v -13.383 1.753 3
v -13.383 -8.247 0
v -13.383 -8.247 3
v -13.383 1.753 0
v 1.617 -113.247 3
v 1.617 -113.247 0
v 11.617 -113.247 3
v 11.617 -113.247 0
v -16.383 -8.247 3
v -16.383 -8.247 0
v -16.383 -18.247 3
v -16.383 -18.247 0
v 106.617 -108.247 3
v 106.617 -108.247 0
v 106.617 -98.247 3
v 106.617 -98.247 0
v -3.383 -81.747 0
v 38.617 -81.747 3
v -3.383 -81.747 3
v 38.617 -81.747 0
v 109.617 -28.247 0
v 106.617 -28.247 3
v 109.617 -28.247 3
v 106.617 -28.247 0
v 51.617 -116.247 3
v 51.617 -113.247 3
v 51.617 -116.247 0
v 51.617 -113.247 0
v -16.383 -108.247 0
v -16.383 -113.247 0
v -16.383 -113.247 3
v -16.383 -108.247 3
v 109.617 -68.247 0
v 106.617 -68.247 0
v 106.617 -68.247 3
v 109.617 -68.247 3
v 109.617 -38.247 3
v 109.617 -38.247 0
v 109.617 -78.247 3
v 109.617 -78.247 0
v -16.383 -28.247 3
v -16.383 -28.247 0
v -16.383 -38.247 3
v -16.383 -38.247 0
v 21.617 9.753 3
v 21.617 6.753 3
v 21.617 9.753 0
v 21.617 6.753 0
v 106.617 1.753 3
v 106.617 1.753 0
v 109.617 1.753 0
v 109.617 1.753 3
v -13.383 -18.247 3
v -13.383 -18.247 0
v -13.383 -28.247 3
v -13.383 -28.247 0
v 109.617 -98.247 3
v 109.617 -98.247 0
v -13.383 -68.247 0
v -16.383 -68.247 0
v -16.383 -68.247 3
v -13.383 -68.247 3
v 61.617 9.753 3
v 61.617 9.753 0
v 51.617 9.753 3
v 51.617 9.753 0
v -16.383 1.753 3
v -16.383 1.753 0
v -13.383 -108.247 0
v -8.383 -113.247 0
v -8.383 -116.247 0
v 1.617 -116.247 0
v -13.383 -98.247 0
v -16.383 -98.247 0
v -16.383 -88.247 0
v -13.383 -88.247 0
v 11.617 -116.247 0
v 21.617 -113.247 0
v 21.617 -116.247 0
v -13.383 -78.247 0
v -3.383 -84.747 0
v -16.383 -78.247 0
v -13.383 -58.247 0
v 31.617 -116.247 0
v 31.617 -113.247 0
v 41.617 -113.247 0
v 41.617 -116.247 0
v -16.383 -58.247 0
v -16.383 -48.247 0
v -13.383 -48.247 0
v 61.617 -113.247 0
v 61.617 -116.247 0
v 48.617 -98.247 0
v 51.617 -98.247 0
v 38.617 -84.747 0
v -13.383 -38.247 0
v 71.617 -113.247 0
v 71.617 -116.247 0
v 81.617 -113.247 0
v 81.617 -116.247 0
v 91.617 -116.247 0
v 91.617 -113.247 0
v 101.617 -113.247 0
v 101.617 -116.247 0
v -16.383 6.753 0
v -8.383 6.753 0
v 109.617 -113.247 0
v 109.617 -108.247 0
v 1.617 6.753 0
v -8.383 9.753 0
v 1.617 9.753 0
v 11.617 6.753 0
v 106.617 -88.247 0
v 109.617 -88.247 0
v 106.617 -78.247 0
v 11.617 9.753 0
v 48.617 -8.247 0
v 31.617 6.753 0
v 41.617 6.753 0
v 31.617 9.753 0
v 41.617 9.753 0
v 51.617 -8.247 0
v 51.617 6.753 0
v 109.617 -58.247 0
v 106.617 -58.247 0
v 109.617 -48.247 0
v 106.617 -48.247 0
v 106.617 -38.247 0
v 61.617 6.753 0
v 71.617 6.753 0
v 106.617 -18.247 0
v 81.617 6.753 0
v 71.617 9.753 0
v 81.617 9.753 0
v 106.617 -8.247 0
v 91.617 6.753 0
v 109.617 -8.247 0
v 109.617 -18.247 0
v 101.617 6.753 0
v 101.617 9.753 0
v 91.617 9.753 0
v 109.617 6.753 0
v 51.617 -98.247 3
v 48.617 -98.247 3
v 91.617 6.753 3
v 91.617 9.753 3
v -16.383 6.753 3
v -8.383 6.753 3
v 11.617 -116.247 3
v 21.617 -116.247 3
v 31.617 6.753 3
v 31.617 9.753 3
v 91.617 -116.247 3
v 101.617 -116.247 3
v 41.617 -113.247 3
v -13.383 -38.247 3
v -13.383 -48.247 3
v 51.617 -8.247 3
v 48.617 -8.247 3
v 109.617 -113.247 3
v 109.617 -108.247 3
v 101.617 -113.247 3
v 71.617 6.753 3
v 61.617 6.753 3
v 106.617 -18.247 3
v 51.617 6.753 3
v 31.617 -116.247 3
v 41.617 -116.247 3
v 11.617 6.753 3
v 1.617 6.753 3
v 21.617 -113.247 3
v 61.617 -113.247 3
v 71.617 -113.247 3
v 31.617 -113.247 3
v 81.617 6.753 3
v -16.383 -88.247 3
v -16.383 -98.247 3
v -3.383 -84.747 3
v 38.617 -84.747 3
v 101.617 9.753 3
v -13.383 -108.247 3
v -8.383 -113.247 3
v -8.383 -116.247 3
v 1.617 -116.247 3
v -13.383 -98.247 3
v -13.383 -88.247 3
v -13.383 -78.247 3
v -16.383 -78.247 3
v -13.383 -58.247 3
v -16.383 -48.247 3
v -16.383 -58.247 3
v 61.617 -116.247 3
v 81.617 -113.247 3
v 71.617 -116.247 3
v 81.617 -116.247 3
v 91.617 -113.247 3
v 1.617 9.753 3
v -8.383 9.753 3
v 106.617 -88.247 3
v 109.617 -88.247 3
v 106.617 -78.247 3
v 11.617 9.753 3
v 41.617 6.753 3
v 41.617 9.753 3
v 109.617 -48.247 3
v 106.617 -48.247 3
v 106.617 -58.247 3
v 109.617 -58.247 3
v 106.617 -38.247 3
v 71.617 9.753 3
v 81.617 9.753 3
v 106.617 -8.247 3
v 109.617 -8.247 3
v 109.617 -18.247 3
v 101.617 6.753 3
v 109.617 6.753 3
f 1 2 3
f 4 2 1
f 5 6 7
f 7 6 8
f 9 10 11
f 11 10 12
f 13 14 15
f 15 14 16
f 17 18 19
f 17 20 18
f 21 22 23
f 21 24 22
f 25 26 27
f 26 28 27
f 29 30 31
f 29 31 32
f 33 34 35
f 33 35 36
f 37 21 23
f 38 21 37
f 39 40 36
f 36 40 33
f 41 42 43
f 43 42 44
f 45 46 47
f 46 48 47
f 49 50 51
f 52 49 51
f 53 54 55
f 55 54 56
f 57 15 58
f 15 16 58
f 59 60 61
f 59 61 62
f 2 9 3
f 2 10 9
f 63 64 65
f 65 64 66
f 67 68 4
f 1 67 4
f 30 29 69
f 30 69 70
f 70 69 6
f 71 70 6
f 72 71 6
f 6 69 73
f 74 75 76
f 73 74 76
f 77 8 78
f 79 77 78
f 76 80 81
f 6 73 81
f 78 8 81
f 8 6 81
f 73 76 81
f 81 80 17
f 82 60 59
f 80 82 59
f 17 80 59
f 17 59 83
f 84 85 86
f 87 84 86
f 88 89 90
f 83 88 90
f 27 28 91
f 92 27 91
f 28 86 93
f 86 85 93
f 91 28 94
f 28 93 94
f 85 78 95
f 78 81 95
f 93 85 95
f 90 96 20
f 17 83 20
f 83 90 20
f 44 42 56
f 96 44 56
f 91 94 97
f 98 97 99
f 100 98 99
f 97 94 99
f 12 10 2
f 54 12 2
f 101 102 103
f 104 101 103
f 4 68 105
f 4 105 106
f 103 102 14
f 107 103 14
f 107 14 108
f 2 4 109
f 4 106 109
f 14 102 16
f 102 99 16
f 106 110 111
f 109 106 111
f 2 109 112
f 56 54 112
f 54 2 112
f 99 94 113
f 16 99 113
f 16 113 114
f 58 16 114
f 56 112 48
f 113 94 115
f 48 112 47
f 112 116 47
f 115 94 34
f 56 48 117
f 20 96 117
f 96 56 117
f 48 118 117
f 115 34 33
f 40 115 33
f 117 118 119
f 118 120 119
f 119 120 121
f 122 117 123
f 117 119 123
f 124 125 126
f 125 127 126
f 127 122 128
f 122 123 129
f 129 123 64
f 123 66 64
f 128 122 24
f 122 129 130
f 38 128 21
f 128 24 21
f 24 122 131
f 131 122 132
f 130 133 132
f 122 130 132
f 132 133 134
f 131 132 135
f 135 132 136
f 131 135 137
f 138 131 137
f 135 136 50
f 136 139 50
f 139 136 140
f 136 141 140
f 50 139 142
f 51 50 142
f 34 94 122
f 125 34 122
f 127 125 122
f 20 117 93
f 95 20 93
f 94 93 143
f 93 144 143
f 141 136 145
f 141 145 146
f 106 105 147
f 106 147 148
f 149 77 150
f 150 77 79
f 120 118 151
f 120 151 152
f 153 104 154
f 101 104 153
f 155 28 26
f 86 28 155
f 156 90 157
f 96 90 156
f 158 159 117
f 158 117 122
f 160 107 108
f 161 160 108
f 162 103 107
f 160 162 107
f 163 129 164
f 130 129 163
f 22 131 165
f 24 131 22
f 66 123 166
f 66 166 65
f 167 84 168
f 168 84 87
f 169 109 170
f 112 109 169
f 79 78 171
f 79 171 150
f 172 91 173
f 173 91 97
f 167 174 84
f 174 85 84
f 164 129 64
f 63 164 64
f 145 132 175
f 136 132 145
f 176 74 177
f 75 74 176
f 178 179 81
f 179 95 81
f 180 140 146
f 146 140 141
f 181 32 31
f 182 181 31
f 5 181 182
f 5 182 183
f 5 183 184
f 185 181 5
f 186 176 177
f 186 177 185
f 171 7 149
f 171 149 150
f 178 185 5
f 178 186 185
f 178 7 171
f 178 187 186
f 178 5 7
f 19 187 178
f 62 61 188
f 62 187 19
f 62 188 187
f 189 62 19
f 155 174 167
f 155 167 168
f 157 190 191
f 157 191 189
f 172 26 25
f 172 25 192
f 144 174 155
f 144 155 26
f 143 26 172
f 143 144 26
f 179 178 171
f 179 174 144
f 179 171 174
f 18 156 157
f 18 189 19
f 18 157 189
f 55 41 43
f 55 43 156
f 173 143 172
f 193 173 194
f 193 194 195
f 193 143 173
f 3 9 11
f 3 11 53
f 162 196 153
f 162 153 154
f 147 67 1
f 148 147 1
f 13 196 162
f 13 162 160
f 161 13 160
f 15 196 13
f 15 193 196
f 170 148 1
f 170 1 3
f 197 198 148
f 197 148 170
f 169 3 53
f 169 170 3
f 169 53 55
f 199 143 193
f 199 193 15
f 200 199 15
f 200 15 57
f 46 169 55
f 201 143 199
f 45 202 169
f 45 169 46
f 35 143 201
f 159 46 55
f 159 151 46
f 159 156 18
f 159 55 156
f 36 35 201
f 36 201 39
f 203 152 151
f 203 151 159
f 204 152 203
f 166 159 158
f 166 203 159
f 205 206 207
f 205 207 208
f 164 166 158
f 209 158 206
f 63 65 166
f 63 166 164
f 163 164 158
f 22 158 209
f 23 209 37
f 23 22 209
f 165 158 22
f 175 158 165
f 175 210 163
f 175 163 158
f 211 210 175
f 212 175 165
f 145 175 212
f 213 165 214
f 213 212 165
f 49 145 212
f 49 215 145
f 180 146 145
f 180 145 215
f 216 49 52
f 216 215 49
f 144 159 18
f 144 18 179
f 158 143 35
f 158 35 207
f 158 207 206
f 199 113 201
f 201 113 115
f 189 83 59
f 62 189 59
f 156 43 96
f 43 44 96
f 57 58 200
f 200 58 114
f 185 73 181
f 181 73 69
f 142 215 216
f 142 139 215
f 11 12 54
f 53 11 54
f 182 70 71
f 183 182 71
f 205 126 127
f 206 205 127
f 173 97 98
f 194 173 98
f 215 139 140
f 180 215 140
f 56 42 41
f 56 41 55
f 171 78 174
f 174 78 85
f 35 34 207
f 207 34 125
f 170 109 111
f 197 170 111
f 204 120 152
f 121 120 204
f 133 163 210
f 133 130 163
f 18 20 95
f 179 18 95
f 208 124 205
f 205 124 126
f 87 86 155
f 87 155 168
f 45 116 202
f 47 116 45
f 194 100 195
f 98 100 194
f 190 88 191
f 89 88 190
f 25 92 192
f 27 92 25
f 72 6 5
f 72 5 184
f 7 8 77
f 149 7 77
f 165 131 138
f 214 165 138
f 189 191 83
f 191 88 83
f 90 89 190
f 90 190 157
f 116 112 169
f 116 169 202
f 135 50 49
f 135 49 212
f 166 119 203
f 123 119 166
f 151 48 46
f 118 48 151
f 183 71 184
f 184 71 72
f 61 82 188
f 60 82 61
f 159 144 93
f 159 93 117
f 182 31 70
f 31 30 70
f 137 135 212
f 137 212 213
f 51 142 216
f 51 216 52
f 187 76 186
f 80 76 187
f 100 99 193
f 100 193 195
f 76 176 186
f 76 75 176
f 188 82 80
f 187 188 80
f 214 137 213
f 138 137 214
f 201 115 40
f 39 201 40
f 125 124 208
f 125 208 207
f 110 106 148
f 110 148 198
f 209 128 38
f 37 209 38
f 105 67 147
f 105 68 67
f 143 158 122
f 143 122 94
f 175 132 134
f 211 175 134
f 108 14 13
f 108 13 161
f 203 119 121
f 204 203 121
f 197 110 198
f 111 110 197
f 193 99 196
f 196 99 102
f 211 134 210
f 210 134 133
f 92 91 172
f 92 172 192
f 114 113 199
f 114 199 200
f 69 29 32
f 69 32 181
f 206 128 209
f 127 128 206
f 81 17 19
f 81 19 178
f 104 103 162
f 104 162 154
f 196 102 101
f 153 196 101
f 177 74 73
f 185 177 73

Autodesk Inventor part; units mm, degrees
ref_plane "YZ Plane" through (0, 0, 0) normal (1, 0, 0) x (0, 1, 0)
ref_plane "XZ Plane" through (0, 0, 0) normal (0, 1, 0) x (-1, 0, 0)
ref_plane "XY Plane" through (0, 0, 0) normal (0, 0, 1) x (1, 0, 0)
sketch "Sketch2" plane through (0, 0, 0) normal (0, 0, 1) x (1, 0, 0)
  line L0 (109.6174, -113.2467) -> (109.6174, -116.2467) projected
  line L1 (106.6174, -113.2467) -> (106.6174, -116.2467) projected
  line L2 (101.6174, -113.2467) -> (109.6174, -113.2467) projected
  line L3 (101.6174, -116.2467) -> (109.6174, -116.2467) projected
  line L4 (101.6174, -113.2467) -> (101.6174, -116.2467) projected
  line L5 (106.6174, -113.2471) -> (106.6174, -108.2467) projected
  line L6 (109.6174, -113.2471) -> (109.6174, -108.2467) projected
  line L7 (106.6174, -108.2467) -> (106.6174, -98.2467) projected
  line L8 (109.6174, -108.2467) -> (109.6174, -98.2467) projected
  line L9 (109.6174, -98.2467) -> (109.6174, -88.2467) projected
  line L10 (106.6174, -98.2467) -> (106.6174, -88.2467) projected
  line L11 (106.6174, -88.2467) -> (106.6174, -78.2467) projected
  line L12 (109.6174, -88.2467) -> (109.6174, -78.2467) projected
  line L13 (109.6174, -78.2467) -> (109.6174, -68.2467) projected
  line L14 (106.6174, -78.2467) -> (106.6174, -68.2467) projected
  line L15 (106.6174, -78.2467) -> (109.6174, -78.2467) projected
  line L16 (106.6174, -88.2467) -> (109.6174, -88.2467) projected
  line L17 (106.6174, -98.2467) -> (109.6174, -98.2467) projected
  line L18 (106.6174, -108.2467) -> (109.6174, -108.2467) projected
  line L19 (91.6174, -113.2467) -> (91.6174, -116.2467) projected
  line L20 (81.6174, -113.2467) -> (81.6174, -116.2467) projected
  line L21 (71.6174, -113.2467) -> (71.6174, -116.2467) projected
  line L22 (61.6174, -113.2467) -> (61.6174, -116.2467) projected
  line L23 (51.6174, -113.2467) -> (51.6174, -116.2467) projected
  line L24 (106.6174, -68.2467) -> (109.6174, -68.2467)
  line L25 (109.6174, -108.2467) -> (106.6174, -108.2467)
  line L26 (109.6174, -98.2467) -> (106.6174, -98.2467)
  line L27 (109.6174, -88.2467) -> (106.6174, -88.2467)
  line L28 (109.6174, -78.2467) -> (106.6174, -78.2467)
  line L29 (101.6174, -113.2467) -> (101.6174, -116.2467)
  line L30 (91.6174, -113.2467) -> (91.6174, -116.2467)
  line L31 (81.6174, -113.2467) -> (81.6174, -116.2467)
  line L32 (71.6174, -113.2467) -> (71.6174, -116.2467)
  line L33 (61.6174, -113.2467) -> (61.6174, -116.2467)
  line L34 (51.6174, -113.2467) -> (51.6174, -116.2467)
  line L35 (106.6174, -113.2471) -> (106.6174, -113.2467)
  line L36 (106.6174, -113.2467) -> (106.6174, -113.2471)
  line L37 (109.6174, -108.2467) -> (109.6174, -113.2467)
  line L38 (106.6174, -98.2467) -> (106.6174, -108.2467)
  line L39 (106.6174, -108.2467) -> (106.6174, -98.2467)
  line L40 (106.6174, -88.2467) -> (106.6174, -78.2467)
  line L41 (109.6174, -68.2467) -> (109.6174, -78.2467)
  line L42 (109.6174, -88.2467) -> (109.6174, -98.2467)
  line L43 (106.6174, -78.2467) -> (106.6174, -88.2467)
  line L44 (101.6174, -113.2471) -> (106.6174, -113.2471)
  line L45 (101.6174, -116.2467) -> (91.6174, -116.2467)
  line L46 (61.6174, -113.2467) -> (71.6174, -113.2468)
  line L47 (81.6174, -113.2469) -> (91.6174, -113.247)
  line L48 (81.6174, -116.2467) -> (71.6174, -116.2467)
  line L49 (61.6174, -116.2467) -> (51.6174, -116.2467)
  line L50 (106.6174, -53.2467) -> (82.6898, -53.2467) construction
  line L51 (46.6174, -113.2467) -> (46.6174, -98.2467) construction
  line L52 (-8.3826, -113.2467) -> (-8.3826, -116.2467)
  line L53 (1.6174, -113.2467) -> (1.6174, -116.2467)
  line L54 (11.6174, -113.2467) -> (11.6174, -116.2467)
  line L55 (21.6174, -113.2467) -> (21.6174, -116.2467)
  line L56 (31.6174, -113.2467) -> (31.6174, -116.2467)
  line L57 (41.6174, -113.2467) -> (41.6174, -116.2467)
  line L58 (-8.3826, -113.2467) -> (-8.3826, -116.2467)
  line L59 (1.6174, -113.2467) -> (1.6174, -116.2467)
  line L60 (11.6174, -113.2467) -> (11.6174, -116.2467)
  line L61 (21.6174, -113.2467) -> (21.6174, -116.2467)
  line L62 (31.6174, -113.2467) -> (31.6174, -116.2467)
  line L63 (41.6174, -113.2467) -> (41.6174, -116.2467)
  line L64 (-8.3826, -116.2467) -> (1.6174, -116.2467)
  line L65 (11.6174, -116.2467) -> (21.6174, -116.2467)
  line L66 (31.6174, -116.2467) -> (41.6174, -116.2467)
  line L67 (-16.3826, -113.2471) -> (-16.3826, -108.2467)
  line L68 (-16.3826, -98.2467) -> (-16.3826, -88.2467)
  line L69 (-16.3826, -78.2467) -> (-16.3826, -68.2467)
  line L70 (-16.3826, -108.2467) -> (-16.3826, -113.2467)
  line L71 (-16.3826, -68.2467) -> (-16.3826, -78.2467)
  line L72 (-16.3826, -88.2467) -> (-16.3826, -98.2467)
  line L73 (109.6174, 6.7533) -> (109.6174, 6.7538)
  line L74 (106.6174, 6.7533) -> (106.6174, 6.7538)
  line L75 (101.6174, 6.7533) -> (109.6174, 6.7533)
  line L76 (101.6174, 6.7533) -> (101.6174, 9.7533)
  line L77 (106.6174, 6.7538) -> (106.6174, 6.7533)
  line L78 (109.6174, 6.7538) -> (109.6174, 1.7533)
  line L79 (106.6174, 1.7533) -> (106.6174, -8.2467)
  line L80 (109.6174, -8.2467) -> (109.6174, -18.2467)
  line L81 (106.6174, -18.2467) -> (106.6174, -28.2467)
  line L82 (109.6174, -28.2467) -> (109.6174, -38.2467)
  line L83 (106.6174, -28.2467) -> (109.6174, -28.2467)
  line L84 (106.6174, -18.2467) -> (109.6174, -18.2467)
  line L85 (106.6174, -8.2467) -> (109.6174, -8.2467)
  line L86 (106.6174, 1.7533) -> (109.6174, 1.7533)
  line L87 (91.6174, 6.7533) -> (91.6174, 9.7533)
  line L88 (81.6174, 6.7533) -> (81.6174, 9.7533)
  line L89 (71.6174, 6.7533) -> (71.6174, 9.7533)
  line L90 (61.6174, 6.7533) -> (61.6174, 9.7533)
  line L91 (51.6174, 6.7533) -> (51.6174, 9.7533)
  line L92 (106.6174, -38.2467) -> (109.6174, -38.2467)
  line L93 (109.6174, 1.7533) -> (106.6174, 1.7533)
  line L94 (109.6174, -8.2467) -> (106.6174, -8.2467)
  line L95 (109.6174, -18.2467) -> (106.6174, -18.2467)
  line L96 (109.6174, -28.2467) -> (106.6174, -28.2467)
  line L97 (101.6174, 6.7533) -> (101.6174, 9.7533)
  line L98 (91.6174, 6.7533) -> (91.6174, 9.7533)
  line L99 (81.6174, 6.7533) -> (81.6174, 9.7533)
  line L100 (71.6174, 6.7533) -> (71.6174, 9.7533)
  line L101 (61.6174, 6.7533) -> (61.6174, 9.7533)
  line L102 (51.6174, 6.7533) -> (51.6174, 9.7533)
  line L103 (106.6174, 6.7538) -> (106.6174, 6.7533)
  line L104 (106.6174, 6.7533) -> (106.6174, 6.7538)
  line L105 (109.6174, 1.7533) -> (109.6174, 6.7533)
  line L106 (106.6174, -8.2467) -> (106.6174, 1.7533)
  line L107 (106.6174, 1.7533) -> (106.6174, -8.2467)
  line L108 (106.6174, -18.2467) -> (106.6174, -28.2467)
  line L109 (109.6174, -38.2467) -> (109.6174, -28.2467)
  line L110 (109.6174, -18.2467) -> (109.6174, -8.2467)
  line L111 (106.6174, -28.2467) -> (106.6174, -18.2467)
  line L112 (101.6174, 6.7538) -> (106.6174, 6.7538)
  line L113 (101.6174, 9.7533) -> (91.6174, 9.7533)
  line L114 (61.6174, 6.7534) -> (71.6174, 6.7535)
  line L115 (81.6174, 6.7536) -> (91.6174, 6.7537)
  line L116 (81.6174, 9.7533) -> (71.6174, 9.7533)
  line L117 (61.6174, 9.7533) -> (51.6174, 9.7533)
  line L118 (46.6174, 6.7533) -> (46.6174, -8.2467) construction
  line L119 (31.6174, 6.7533) -> (31.6174, 9.7533)
  line L120 (41.6174, 6.7533) -> (41.6174, 9.7533)
  line L121 (31.6174, 6.7533) -> (31.6174, 9.7533)
  line L122 (41.6174, 6.7533) -> (41.6174, 9.7533)
  line L123 (31.6174, 9.7533) -> (41.6174, 9.7533)
  line L124 (-8.3826, 6.7533) -> (-8.3826, 9.7533)
  line L125 (1.6174, 6.7533) -> (1.6174, 9.7533)
  line L126 (11.6174, 6.7533) -> (11.6174, 9.7533)
  line L127 (21.6174, 6.7533) -> (21.6174, 9.7533)
  line L128 (-8.3826, 6.7533) -> (-8.3826, 9.7533)
  line L129 (1.6174, 6.7533) -> (1.6174, 9.7533)
  line L130 (-8.3826, 9.7533) -> (1.6174, 9.7533)
  line L131 (11.6174, 6.7533) -> (11.6174, 9.7533)
  line L132 (21.6174, 6.7533) -> (21.6174, 9.7533)
  line L133 (11.6174, 9.7533) -> (21.6174, 9.7533)
  line L134 (-16.3826, -8.2467) -> (-16.3826, -18.2467)
  line L135 (-16.3826, -18.2467) -> (-16.3826, -8.2467)
  line L136 (-16.3826, 1.7533) -> (-16.3826, 6.7533)
  line L137 (-16.3826, 6.7538) -> (-16.3826, 1.7533)
  line L138 (-16.3826, -28.2467) -> (-16.3826, -38.2467)
  line L139 (-16.3826, -38.2467) -> (-16.3826, -28.2467)
  line L140 (109.6174, -58.2467) -> (106.6174, -58.2467)
  line L141 (109.6174, -58.2467) -> (109.6174, -48.2467)
  line L142 (109.6174, -48.2467) -> (106.6174, -48.2467)
  line L143 (-16.3826, -68.2467) -> (-13.3826, -68.2467)
  line L144 (-16.3826, -58.2467) -> (-13.3826, -58.2467)
  line L145 (-16.3826, -58.2467) -> (-16.3826, -48.2467)
  line L146 (-16.3826, -48.2467) -> (-13.3826, -48.2467)
  line L147 (-16.3826, -38.2467) -> (-13.3826, -38.2467)
  line L148 (-16.3826, -108.2467) -> (-13.3826, -108.2467)
  line L149 (-16.3826, -98.2467) -> (-13.3826, -98.2467)
  line L150 (-16.3826, -88.2467) -> (-13.3826, -88.2467)
  line L151 (-16.3826, -78.2467) -> (-13.3826, -78.2467)
  line L152 (-16.3826, -28.2467) -> (-13.3826, -28.2467)
  line L153 (-16.3826, -18.2467) -> (-13.3826, -18.2467)
  line L154 (-16.3826, -8.2467) -> (-13.3826, -8.2467)
  line L155 (106.6174, -113.2467) -> (106.6174, -113.2471)
  line L156 (106.6174, -113.2471) -> (106.6174, -113.2467)
  line L157 (109.6174, -113.2467) -> (101.6174, -113.2467)
  line L158 (91.6174, -113.2467) -> (81.6174, -113.2467)
  line L159 (71.6174, -113.2467) -> (61.6174, -113.2467)
  line L160 (51.6174, -113.2467) -> (46.6174, -113.2467)
  line L161 (41.6174, -113.2467) -> (46.6174, -113.2467)
  line L162 (21.6174, -113.2467) -> (31.6174, -113.2467)
  line L163 (-16.3826, -113.2467) -> (-8.3826, -113.2467)
  line L164 (1.6174, -113.2467) -> (11.6174, -113.2467)
  line L165 (-13.3826, -98.2467) -> (-13.3826, -108.2467)
  line L166 (-13.3826, -108.2467) -> (-13.3826, -98.2467)
  line L167 (-13.3826, -88.2467) -> (-13.3826, -78.2467)
  line L168 (-13.3826, -78.2467) -> (-13.3826, -88.2467)
  line L169 (-13.3826, -58.2467) -> (-13.3826, -68.2467)
  line L170 (-13.3826, -68.2467) -> (-13.3826, -58.2467)
  line L171 (-13.3826, -48.2467) -> (-13.3826, -38.2467)
  line L172 (-13.3826, -38.2467) -> (-13.3826, -48.2467)
  line L173 (-13.3826, -18.2467) -> (-13.3826, -28.2467)
  line L174 (-13.3826, -28.2467) -> (-13.3826, -18.2467)
  line L175 (-16.3826, 1.7533) -> (-13.3826, 1.7533)
  line L176 (-13.3826, -8.2467) -> (-13.3826, 1.7533)
  line L177 (-13.3826, 1.7533) -> (-13.3826, -8.2467)
  line L178 (-16.3826, 6.7533) -> (-8.3826, 6.7533)
  line L179 (1.6174, 6.7533) -> (11.6174, 6.7533)
  line L180 (21.6174, 6.7533) -> (31.6174, 6.7533)
  line L181 (41.6174, 6.7533) -> (46.6174, 6.7533)
  line L182 (51.6174, 6.7533) -> (46.6174, 6.7533)
  line L183 (71.6174, 6.7533) -> (61.6174, 6.7533)
  line L184 (109.6174, 6.7533) -> (101.6174, 6.7533)
  line L185 (91.6174, 6.7533) -> (81.6174, 6.7533)
  line L186 (106.6174, 6.7533) -> (106.6174, 6.7538)
  line L187 (106.6174, 6.7538) -> (106.6174, 6.7533)
  line L188 (106.6174, 1.7533) -> (106.6174, -8.2467)
  line L189 (106.6174, -8.2467) -> (106.6174, 1.7533)
  line L190 (106.6174, -28.2467) -> (106.6174, -18.2467)
  line L191 (106.6174, -18.2467) -> (106.6174, -28.2467)
  line L192 (106.6174, -38.2467) -> (106.6174, -48.2467)
  line L193 (106.6174, -48.2467) -> (106.6174, -38.2467)
  line L194 (106.6174, -68.2467) -> (106.6174, -58.2467)
  line L195 (106.6174, -58.2467) -> (106.6174, -68.2467)
  line L196 (106.6174, -78.2467) -> (106.6174, -88.2467)
  line L197 (106.6174, -98.2467) -> (106.6174, -108.2467)
  line L198 (106.6174, -108.2467) -> (106.6174, -98.2467)
  line L199 (106.6174, -88.2467) -> (106.6174, -78.2467)
  point P0 (0, 0)
  point P1 (106.6174, -116.2467)
  point P2 (-13.3826, -113.2467)
extrude "Extrusion2" add sketch "Sketch2" along normal blind 3 contours L2 L5 L18 L6 | L2 L4 L45 L19 L47 L20 L48 L21 L46 L22 L49 L23 L160 L161 L57 L66 L56 L162 L55 L65 L54 L164 L53 L64 L52 L163 L67 L148 L165 L149 L68 L150 L167 L151 L69 L143 L169 L144 L145 L146 L171 L147 L138 L152 L173 L153 L134 L154 L176 L175 L136 L178 L124 L130 L125 L179 L126 L133 L127 L180 L119 L123 L120 L181 L182 L91 L117 L90 L114 L89 L116 L88 L115 L87 L113 L76 L75 L78 L86 L79 L85 L80 L84 L81 L83 L82 L92 L192 L142 L141 L140 L194 L14 L11 L10 L7 L5 | L17 L10 L16 L9 | L15 L14 L24 L13
sketch "Sketch3" plane through (0, 0, 3) normal (0, 0, 1) x (1, 0, 0)
  line L0 (51.6174, 4.7533) -> (51.6174, -111.2467) projected
  line L1 (51.6174, 4.7533) -> (48.6174, 4.7533)
  line L2 (41.6174, -113.2467) -> (51.6174, -113.2467) projected
  line L3 (51.6174, -113.2467) -> (51.6174, -53.2467)
  line L4 (51.6174, -53.2467) -> (48.6174, -53.2467)
  line L5 (48.6174, -53.2467) -> (48.6174, -8.2467)
  line L6 (48.6174, -8.2467) -> (51.6174, -8.2467)
  line L7 (48.6174, -53.2467) -> (48.6174, -98.2467)
  line L8 (48.6174, -98.2467) -> (51.6174, -98.2467)
  line L9 (51.6174, -98.2467) -> (51.6174, -8.2467)
  point P0 (0, 0)
  dimension "d20" = 60
  dimension "d21" = 45
  dimension "d22" = 45
extrude "Extrusion3" cut sketch "Sketch3" against normal blind 3
sketch "Sketch4" plane through (0, 0, 0) normal (0, 0, -1) x (-1, 0, 0)
  line L0 (-21.6174, -113.2467) -> (-31.6174, -113.2467) projected
  line L1 (13.3826, -58.2467) -> (13.3826, -68.2467) projected
  line L2 (-38.6174, -81.7467) -> (-38.6174, -84.7467)
  line L3 (-48.6174, -98.2467) -> (-48.6174, -8.2467) projected
  line L4 (-38.6174, -84.7467) -> (3.3826, -84.7467)
  circle A0 centre (-68.8966, -83.2467) radius 3 projected
  line L5 (-38.6174, -81.7467) -> (3.3826, -81.7467)
  line L6 (3.3826, -81.7467) -> (3.3826, -84.7467)
  line L7 (13.3826, -78.2467) -> (13.3826, -88.2467) projected
  point P0 (0, 0)
  point P1 (-38.6174, -83.2467)
  dimension "d27" = 3
  dimension "d32" = 42
  dimension "d33" = 42
  dimension "d34" = 10
  dimension "d35" = 10
extrude "Extrusion4" cut sketch "Sketch4" against normal blind 10 contours L5 L6 L4 L2
properties part number "bottom"
